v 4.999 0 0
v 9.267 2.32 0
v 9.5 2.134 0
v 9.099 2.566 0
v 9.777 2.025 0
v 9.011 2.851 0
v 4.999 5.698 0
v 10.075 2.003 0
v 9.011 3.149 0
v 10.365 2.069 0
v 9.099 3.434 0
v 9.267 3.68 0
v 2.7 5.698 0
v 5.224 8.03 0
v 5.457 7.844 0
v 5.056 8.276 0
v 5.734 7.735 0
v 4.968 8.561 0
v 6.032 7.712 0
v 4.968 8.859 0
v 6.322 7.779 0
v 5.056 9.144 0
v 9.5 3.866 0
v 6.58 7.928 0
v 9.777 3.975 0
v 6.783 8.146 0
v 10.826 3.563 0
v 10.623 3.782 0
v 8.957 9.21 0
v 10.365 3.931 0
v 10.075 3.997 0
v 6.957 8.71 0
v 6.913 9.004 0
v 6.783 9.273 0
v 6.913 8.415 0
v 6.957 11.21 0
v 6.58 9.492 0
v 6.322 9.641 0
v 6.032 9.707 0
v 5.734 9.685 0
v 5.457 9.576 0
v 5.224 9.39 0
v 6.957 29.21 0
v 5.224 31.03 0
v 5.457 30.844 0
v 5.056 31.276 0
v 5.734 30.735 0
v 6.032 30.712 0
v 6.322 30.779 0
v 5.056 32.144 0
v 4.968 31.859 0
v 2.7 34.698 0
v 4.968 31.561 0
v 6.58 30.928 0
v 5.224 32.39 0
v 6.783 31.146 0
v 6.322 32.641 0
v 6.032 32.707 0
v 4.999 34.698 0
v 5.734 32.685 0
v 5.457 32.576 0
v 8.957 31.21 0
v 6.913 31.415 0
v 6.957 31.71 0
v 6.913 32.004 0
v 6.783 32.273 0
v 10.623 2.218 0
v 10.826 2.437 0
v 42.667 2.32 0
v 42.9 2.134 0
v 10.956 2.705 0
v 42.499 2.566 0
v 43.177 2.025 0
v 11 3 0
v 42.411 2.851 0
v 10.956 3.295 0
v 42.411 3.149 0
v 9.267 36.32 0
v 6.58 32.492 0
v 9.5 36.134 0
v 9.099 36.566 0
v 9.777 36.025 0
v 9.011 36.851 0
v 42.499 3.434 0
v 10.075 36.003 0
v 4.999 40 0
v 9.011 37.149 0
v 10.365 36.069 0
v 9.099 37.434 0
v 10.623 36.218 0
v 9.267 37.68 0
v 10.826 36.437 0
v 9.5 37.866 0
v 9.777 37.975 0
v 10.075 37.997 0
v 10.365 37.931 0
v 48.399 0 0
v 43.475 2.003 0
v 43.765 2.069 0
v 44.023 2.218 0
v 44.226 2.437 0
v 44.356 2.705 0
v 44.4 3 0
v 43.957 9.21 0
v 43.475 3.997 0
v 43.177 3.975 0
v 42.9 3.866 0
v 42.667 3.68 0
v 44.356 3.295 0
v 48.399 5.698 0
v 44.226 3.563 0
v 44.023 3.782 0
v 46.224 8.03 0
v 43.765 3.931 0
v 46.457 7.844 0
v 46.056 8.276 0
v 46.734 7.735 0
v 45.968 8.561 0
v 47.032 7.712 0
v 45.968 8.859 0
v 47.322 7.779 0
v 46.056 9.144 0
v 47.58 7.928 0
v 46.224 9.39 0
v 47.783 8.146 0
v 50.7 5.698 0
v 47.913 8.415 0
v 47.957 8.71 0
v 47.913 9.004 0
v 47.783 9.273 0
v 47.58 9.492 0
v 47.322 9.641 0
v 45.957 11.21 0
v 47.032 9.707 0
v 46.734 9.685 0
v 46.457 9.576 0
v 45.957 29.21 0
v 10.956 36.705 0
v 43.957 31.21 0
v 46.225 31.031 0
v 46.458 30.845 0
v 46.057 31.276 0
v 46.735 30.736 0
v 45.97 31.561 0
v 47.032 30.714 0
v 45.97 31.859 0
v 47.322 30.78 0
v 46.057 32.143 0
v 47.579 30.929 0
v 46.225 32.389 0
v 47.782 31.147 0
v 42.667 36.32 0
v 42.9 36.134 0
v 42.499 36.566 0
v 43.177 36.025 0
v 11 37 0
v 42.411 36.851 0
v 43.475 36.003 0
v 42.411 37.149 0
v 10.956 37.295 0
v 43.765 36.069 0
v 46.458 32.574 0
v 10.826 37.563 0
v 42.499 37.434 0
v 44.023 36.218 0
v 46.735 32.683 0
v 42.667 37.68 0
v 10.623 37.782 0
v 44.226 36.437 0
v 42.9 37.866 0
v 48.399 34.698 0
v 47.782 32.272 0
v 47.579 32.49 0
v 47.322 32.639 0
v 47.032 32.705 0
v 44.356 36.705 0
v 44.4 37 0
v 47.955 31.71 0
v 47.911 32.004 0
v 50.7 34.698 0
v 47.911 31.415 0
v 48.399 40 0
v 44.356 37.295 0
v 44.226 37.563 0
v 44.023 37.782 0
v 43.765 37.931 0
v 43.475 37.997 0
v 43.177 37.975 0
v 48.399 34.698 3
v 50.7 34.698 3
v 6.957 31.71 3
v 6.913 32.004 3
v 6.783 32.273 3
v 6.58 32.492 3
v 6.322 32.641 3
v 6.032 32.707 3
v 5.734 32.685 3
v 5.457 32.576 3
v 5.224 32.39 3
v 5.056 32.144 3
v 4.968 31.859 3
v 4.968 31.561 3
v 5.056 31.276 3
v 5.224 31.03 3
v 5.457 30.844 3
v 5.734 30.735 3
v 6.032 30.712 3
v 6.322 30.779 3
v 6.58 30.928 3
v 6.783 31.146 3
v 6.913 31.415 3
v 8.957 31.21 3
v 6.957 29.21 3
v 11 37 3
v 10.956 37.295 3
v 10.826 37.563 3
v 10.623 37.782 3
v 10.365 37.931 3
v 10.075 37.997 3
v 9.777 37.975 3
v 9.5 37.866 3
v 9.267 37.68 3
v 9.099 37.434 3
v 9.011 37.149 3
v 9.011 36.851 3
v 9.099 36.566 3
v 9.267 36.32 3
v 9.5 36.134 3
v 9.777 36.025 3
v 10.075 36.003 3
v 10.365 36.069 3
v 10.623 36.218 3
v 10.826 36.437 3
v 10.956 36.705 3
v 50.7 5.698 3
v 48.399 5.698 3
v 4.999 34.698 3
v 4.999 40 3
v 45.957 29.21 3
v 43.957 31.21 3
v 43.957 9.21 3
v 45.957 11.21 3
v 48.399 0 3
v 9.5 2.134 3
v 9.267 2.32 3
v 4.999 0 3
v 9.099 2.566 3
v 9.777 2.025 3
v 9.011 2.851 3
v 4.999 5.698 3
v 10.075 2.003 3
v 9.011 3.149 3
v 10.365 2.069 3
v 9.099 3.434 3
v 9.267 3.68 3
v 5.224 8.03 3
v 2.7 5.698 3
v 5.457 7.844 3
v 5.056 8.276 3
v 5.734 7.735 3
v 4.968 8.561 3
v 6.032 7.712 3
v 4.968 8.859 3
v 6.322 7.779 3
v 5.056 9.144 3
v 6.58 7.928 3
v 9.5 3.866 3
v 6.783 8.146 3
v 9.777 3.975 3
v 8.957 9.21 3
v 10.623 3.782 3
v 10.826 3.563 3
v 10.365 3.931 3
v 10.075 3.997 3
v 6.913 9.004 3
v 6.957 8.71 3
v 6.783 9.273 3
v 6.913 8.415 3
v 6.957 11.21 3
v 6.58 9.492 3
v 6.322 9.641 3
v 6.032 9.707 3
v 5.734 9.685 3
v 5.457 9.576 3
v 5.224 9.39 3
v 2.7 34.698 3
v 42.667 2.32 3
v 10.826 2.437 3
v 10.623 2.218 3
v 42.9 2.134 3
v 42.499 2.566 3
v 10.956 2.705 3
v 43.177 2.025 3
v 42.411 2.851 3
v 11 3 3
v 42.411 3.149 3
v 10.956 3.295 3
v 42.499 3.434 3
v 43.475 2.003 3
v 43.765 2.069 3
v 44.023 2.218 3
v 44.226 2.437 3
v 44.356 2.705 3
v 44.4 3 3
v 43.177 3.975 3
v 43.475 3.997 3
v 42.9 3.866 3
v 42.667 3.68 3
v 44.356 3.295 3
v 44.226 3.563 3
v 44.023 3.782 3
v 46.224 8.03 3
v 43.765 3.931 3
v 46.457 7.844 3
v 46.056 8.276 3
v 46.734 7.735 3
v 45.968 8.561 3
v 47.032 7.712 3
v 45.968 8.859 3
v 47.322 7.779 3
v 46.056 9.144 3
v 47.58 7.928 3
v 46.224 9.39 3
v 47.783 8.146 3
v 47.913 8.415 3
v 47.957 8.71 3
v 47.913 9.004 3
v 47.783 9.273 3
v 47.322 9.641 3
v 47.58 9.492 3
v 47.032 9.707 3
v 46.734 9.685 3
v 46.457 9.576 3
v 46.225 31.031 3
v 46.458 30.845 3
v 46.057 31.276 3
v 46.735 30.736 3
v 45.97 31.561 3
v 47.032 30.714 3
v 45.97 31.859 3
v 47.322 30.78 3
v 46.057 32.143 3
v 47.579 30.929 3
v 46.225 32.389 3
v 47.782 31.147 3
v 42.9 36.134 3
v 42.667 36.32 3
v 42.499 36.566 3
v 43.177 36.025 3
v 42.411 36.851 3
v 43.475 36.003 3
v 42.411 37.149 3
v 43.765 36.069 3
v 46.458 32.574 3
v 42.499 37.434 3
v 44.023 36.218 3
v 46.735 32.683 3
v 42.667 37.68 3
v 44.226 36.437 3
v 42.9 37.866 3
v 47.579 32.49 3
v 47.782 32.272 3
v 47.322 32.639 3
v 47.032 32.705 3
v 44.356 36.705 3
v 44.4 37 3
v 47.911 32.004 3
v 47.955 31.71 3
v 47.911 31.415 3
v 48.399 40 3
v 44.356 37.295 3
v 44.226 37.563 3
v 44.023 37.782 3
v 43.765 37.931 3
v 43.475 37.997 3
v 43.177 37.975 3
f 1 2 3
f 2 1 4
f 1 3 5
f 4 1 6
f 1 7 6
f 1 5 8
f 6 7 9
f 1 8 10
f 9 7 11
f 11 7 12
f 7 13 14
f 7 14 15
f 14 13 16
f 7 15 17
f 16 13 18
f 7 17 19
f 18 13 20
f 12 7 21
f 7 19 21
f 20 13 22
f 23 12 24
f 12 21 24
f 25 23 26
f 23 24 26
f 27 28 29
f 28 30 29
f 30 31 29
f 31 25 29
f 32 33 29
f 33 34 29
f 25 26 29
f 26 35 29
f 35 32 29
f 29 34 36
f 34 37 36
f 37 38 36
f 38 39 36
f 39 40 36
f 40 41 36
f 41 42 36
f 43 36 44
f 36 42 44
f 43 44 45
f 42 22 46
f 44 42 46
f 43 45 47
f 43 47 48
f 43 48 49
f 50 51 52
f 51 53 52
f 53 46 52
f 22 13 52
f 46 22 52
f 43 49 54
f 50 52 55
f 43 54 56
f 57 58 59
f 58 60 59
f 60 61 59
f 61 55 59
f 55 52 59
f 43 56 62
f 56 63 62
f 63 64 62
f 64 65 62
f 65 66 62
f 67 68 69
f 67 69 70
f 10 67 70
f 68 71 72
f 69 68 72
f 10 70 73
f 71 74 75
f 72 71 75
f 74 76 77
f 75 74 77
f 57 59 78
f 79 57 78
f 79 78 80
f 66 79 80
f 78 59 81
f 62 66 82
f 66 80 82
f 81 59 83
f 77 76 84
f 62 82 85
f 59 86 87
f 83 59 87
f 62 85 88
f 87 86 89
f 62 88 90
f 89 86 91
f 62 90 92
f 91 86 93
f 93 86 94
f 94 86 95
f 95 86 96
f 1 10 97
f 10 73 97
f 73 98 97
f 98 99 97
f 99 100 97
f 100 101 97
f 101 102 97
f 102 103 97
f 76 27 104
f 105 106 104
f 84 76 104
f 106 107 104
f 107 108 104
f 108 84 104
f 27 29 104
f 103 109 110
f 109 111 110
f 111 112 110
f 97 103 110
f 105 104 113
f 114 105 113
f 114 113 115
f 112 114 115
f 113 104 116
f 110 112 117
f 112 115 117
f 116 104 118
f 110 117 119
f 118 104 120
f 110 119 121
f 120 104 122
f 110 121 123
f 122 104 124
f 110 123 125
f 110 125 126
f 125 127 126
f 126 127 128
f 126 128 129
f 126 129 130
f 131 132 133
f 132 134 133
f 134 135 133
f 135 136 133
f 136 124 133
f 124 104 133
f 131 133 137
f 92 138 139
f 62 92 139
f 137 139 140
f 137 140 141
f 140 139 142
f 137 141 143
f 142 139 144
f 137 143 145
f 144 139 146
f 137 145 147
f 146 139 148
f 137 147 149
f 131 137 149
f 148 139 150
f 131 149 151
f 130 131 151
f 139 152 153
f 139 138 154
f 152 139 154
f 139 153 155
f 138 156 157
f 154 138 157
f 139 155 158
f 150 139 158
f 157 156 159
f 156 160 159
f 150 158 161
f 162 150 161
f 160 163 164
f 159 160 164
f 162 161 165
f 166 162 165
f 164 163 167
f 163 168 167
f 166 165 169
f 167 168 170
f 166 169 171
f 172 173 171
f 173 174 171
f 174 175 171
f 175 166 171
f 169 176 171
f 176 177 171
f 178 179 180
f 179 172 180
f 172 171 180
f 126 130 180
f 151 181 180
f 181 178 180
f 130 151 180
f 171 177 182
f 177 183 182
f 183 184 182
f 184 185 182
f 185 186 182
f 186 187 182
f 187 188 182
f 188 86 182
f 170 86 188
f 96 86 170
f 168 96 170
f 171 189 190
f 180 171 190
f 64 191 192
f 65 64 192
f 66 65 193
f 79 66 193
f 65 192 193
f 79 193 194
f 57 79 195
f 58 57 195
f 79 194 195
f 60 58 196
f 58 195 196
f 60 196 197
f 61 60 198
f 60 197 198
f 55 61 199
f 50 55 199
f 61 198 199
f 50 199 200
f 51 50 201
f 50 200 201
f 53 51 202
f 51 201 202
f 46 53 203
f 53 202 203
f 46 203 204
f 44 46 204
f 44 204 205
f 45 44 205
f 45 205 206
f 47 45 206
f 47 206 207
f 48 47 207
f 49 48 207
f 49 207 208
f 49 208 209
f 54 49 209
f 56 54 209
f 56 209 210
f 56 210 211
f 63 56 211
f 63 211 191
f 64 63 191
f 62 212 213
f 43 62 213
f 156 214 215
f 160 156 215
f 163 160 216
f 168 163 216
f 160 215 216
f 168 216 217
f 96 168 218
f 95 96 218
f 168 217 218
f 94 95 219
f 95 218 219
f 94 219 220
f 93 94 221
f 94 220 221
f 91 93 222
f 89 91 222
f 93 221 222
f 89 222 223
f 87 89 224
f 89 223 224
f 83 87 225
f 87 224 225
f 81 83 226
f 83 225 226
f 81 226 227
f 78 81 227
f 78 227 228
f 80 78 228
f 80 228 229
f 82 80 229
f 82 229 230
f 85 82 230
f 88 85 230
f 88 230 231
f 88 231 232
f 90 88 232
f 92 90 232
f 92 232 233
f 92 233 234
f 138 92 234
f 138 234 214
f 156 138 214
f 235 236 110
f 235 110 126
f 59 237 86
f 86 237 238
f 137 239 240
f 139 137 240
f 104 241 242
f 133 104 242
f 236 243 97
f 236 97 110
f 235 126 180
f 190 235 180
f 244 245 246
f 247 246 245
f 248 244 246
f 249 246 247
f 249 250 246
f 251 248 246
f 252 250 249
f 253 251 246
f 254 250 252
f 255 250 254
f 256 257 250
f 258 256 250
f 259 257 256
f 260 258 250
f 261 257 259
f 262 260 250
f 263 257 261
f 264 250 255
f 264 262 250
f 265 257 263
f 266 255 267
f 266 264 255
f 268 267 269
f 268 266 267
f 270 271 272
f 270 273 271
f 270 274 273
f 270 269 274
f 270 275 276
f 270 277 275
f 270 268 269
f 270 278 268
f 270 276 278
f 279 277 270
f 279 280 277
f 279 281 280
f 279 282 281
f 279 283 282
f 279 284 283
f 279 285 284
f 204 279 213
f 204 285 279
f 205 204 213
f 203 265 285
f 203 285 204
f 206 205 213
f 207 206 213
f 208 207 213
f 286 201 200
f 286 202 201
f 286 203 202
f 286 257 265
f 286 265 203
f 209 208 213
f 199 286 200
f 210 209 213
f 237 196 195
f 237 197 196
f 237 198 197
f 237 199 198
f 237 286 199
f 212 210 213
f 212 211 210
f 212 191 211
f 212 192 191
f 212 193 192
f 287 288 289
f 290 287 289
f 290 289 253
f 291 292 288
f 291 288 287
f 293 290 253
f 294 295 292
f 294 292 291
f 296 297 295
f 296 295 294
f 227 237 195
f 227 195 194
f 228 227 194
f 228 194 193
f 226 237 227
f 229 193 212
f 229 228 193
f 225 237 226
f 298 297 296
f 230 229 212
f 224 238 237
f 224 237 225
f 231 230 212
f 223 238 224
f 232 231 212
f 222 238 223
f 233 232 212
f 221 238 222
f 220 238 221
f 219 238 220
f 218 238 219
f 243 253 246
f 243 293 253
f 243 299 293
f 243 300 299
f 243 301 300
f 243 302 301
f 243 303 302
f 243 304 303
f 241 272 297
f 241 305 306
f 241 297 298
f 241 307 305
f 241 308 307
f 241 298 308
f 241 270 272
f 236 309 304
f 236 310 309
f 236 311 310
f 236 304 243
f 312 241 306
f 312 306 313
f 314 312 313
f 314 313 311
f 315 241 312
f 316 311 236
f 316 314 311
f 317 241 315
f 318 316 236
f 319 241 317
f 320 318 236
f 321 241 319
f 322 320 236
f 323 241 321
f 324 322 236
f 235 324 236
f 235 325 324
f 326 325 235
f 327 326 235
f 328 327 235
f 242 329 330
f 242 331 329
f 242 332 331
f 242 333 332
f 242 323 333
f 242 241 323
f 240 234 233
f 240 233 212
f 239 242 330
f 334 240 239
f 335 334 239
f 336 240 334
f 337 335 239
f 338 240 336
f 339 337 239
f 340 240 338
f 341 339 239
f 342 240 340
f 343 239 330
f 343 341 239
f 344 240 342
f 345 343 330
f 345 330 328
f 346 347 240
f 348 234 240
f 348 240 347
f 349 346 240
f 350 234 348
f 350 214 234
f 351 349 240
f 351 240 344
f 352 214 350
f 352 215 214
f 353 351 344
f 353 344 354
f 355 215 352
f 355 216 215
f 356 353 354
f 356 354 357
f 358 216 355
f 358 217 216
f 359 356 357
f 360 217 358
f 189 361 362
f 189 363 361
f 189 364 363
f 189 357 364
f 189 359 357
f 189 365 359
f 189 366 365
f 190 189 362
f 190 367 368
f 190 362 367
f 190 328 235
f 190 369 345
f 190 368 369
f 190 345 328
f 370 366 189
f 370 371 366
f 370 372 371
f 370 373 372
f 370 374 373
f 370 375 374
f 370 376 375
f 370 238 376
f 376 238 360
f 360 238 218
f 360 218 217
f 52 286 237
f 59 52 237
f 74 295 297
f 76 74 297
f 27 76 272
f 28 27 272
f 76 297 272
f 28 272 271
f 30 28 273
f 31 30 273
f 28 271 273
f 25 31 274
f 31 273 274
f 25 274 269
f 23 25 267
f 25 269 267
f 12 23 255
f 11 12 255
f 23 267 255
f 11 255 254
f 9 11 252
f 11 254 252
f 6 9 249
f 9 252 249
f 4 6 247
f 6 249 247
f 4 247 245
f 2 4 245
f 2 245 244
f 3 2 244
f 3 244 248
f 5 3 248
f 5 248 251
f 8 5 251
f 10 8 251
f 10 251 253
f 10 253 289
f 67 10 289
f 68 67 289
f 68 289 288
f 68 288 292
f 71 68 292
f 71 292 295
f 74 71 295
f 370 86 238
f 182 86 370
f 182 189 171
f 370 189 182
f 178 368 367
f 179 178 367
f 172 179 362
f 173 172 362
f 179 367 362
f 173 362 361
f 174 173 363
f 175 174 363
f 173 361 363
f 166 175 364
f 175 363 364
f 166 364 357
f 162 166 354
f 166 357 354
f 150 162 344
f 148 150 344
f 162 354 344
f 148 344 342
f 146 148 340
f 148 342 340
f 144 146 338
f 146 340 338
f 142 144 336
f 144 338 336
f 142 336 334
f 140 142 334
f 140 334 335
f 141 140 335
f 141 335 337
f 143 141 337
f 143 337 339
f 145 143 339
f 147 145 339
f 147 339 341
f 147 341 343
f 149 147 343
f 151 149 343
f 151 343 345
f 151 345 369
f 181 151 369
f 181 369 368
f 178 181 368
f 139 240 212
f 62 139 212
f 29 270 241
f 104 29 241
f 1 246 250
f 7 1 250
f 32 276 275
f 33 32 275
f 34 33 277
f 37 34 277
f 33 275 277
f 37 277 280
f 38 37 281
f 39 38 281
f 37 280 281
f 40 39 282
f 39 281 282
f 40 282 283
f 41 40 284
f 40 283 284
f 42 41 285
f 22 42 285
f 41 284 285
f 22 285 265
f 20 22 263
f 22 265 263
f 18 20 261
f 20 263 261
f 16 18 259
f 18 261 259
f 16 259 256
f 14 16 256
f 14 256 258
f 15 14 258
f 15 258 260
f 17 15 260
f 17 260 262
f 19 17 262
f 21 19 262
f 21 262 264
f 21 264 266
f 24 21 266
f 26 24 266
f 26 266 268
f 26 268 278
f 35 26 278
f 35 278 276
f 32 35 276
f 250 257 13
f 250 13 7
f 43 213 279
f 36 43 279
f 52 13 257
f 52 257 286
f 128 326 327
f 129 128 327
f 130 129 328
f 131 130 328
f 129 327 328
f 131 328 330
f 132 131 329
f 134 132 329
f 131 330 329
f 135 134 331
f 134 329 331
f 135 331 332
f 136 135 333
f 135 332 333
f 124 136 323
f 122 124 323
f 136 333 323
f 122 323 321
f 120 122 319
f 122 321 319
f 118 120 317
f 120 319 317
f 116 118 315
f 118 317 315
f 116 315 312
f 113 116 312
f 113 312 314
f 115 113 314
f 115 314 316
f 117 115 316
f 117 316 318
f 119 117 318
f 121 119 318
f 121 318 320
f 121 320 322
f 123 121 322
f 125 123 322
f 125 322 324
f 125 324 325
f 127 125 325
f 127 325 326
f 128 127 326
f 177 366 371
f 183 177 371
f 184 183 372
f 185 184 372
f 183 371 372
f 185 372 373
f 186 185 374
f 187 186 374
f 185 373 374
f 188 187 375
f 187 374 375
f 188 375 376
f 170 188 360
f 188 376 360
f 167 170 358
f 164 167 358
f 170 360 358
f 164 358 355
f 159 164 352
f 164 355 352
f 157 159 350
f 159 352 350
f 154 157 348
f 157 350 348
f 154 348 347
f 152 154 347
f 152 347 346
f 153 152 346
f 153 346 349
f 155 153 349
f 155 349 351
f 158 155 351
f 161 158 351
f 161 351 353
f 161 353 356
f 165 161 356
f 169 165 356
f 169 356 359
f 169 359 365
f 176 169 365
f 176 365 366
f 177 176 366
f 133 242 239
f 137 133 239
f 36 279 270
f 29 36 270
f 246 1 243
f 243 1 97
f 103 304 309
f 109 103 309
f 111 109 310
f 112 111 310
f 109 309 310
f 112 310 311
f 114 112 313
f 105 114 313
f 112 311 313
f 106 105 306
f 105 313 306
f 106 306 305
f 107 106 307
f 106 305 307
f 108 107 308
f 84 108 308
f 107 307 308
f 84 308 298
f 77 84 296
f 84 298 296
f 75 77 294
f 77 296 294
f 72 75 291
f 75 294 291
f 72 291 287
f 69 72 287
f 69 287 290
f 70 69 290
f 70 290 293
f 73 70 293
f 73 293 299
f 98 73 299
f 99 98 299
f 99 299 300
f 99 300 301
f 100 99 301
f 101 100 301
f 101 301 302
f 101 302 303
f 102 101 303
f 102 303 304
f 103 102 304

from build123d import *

# Parameters (mm, degrees)
ESBO_O1_W                = 48
ESBO_O1_H                = 40
RESSALTO_EXTRUS_O1_DEPTH = 3
ESBO_O2_R                = 1
CORTE_EXTRUS_O1_DEPTH    = 4
ESBO_O3_W                = 9.79419224
ESBO_O3_H                = 12.19966749
ESBO_O3_H_2              = 11.54056128
ESBO_O3_W_2              = 8.914185242
CORTE_EXTRUS_O2_DEPTH    = 10
CORTE_EXTRUS_O3_DEPTH    = 4
ESBO_O5_R                = 1
ESBO_O5_R_2              = 0.998470841
CORTE_EXTRUS_O4_DEPTH    = 4


with BuildPart() as part:
    # Esboço1 → Ressalto-extrusão1 (new body)
    with BuildSketch(Plane.XY):
        with Locations((26.7, 20)):
            Rectangle(ESBO_O1_W, ESBO_O1_H)
    extrude(amount=RESSALTO_EXTRUS_O1_DEPTH)

    # Esboço2 → Corte-extrusão1 (cut, through all)
    with BuildSketch(Plane.XY.offset(3)):
        with Locations((10, 37)):
            Circle(ESBO_O2_R)
        with Locations((10, 3)):
            Circle(ESBO_O2_R)
        with Locations((43.4, 3)):
            Circle(ESBO_O2_R)
        with Locations((43.4, 37)):
            Circle(ESBO_O2_R)
    extrude(amount=-CORTE_EXTRUS_O1_DEPTH, mode=Mode.SUBTRACT)

    # Esboço3 → Corte-extrusão2 (cut)
    with BuildSketch(Plane.XY.offset(3)):
        with Locations((53.2961889, 40.797789277)):
            Rectangle(ESBO_O3_W, ESBO_O3_H)
        with Locations((53.2961889, -0.072325108)):
            Rectangle(ESBO_O3_W, ESBO_O3_H_2)
        with Locations((0.54181876, -0.072325108)):
            Rectangle(ESBO_O3_W_2, ESBO_O3_H_2)
        with Locations((0.54181876, 40.797789277)):
            Rectangle(ESBO_O3_W_2, ESBO_O3_H)
    extrude(amount=-CORTE_EXTRUS_O2_DEPTH, mode=Mode.SUBTRACT)

    # Esboço4 → Corte-extrusão3 (cut, through all)
    with BuildSketch(Plane.XY.offset(3)):
        Polygon((8.956927741, 31.209698911), (6.956927741, 29.209698911), (6.956927741, 11.209698911), (8.956927741, 9.209698911), (43.956927741, 9.209698911), (45.956927741, 11.209698911), (45.956927741, 29.209698911), (43.956927741, 31.209698911), align=None)
    extrude(amount=-CORTE_EXTRUS_O3_DEPTH, mode=Mode.SUBTRACT)

    # Esboço5 → Corte-extrusão4 (cut, through all)
    with BuildSketch(Plane.XY.offset(3)):
        with Locations((5.956927741, 31.709698911)):
            Circle(ESBO_O5_R)
        with Locations((46.956927741, 31.709698911)):
            Circle(ESBO_O5_R_2)
        with Locations((46.956927741, 8.709698911)):
            Circle(ESBO_O5_R)
        with Locations((5.956927741, 8.709698911)):
            Circle(ESBO_O5_R)
    extrude(amount=-CORTE_EXTRUS_O4_DEPTH, mode=Mode.SUBTRACT)


solid = part.part
